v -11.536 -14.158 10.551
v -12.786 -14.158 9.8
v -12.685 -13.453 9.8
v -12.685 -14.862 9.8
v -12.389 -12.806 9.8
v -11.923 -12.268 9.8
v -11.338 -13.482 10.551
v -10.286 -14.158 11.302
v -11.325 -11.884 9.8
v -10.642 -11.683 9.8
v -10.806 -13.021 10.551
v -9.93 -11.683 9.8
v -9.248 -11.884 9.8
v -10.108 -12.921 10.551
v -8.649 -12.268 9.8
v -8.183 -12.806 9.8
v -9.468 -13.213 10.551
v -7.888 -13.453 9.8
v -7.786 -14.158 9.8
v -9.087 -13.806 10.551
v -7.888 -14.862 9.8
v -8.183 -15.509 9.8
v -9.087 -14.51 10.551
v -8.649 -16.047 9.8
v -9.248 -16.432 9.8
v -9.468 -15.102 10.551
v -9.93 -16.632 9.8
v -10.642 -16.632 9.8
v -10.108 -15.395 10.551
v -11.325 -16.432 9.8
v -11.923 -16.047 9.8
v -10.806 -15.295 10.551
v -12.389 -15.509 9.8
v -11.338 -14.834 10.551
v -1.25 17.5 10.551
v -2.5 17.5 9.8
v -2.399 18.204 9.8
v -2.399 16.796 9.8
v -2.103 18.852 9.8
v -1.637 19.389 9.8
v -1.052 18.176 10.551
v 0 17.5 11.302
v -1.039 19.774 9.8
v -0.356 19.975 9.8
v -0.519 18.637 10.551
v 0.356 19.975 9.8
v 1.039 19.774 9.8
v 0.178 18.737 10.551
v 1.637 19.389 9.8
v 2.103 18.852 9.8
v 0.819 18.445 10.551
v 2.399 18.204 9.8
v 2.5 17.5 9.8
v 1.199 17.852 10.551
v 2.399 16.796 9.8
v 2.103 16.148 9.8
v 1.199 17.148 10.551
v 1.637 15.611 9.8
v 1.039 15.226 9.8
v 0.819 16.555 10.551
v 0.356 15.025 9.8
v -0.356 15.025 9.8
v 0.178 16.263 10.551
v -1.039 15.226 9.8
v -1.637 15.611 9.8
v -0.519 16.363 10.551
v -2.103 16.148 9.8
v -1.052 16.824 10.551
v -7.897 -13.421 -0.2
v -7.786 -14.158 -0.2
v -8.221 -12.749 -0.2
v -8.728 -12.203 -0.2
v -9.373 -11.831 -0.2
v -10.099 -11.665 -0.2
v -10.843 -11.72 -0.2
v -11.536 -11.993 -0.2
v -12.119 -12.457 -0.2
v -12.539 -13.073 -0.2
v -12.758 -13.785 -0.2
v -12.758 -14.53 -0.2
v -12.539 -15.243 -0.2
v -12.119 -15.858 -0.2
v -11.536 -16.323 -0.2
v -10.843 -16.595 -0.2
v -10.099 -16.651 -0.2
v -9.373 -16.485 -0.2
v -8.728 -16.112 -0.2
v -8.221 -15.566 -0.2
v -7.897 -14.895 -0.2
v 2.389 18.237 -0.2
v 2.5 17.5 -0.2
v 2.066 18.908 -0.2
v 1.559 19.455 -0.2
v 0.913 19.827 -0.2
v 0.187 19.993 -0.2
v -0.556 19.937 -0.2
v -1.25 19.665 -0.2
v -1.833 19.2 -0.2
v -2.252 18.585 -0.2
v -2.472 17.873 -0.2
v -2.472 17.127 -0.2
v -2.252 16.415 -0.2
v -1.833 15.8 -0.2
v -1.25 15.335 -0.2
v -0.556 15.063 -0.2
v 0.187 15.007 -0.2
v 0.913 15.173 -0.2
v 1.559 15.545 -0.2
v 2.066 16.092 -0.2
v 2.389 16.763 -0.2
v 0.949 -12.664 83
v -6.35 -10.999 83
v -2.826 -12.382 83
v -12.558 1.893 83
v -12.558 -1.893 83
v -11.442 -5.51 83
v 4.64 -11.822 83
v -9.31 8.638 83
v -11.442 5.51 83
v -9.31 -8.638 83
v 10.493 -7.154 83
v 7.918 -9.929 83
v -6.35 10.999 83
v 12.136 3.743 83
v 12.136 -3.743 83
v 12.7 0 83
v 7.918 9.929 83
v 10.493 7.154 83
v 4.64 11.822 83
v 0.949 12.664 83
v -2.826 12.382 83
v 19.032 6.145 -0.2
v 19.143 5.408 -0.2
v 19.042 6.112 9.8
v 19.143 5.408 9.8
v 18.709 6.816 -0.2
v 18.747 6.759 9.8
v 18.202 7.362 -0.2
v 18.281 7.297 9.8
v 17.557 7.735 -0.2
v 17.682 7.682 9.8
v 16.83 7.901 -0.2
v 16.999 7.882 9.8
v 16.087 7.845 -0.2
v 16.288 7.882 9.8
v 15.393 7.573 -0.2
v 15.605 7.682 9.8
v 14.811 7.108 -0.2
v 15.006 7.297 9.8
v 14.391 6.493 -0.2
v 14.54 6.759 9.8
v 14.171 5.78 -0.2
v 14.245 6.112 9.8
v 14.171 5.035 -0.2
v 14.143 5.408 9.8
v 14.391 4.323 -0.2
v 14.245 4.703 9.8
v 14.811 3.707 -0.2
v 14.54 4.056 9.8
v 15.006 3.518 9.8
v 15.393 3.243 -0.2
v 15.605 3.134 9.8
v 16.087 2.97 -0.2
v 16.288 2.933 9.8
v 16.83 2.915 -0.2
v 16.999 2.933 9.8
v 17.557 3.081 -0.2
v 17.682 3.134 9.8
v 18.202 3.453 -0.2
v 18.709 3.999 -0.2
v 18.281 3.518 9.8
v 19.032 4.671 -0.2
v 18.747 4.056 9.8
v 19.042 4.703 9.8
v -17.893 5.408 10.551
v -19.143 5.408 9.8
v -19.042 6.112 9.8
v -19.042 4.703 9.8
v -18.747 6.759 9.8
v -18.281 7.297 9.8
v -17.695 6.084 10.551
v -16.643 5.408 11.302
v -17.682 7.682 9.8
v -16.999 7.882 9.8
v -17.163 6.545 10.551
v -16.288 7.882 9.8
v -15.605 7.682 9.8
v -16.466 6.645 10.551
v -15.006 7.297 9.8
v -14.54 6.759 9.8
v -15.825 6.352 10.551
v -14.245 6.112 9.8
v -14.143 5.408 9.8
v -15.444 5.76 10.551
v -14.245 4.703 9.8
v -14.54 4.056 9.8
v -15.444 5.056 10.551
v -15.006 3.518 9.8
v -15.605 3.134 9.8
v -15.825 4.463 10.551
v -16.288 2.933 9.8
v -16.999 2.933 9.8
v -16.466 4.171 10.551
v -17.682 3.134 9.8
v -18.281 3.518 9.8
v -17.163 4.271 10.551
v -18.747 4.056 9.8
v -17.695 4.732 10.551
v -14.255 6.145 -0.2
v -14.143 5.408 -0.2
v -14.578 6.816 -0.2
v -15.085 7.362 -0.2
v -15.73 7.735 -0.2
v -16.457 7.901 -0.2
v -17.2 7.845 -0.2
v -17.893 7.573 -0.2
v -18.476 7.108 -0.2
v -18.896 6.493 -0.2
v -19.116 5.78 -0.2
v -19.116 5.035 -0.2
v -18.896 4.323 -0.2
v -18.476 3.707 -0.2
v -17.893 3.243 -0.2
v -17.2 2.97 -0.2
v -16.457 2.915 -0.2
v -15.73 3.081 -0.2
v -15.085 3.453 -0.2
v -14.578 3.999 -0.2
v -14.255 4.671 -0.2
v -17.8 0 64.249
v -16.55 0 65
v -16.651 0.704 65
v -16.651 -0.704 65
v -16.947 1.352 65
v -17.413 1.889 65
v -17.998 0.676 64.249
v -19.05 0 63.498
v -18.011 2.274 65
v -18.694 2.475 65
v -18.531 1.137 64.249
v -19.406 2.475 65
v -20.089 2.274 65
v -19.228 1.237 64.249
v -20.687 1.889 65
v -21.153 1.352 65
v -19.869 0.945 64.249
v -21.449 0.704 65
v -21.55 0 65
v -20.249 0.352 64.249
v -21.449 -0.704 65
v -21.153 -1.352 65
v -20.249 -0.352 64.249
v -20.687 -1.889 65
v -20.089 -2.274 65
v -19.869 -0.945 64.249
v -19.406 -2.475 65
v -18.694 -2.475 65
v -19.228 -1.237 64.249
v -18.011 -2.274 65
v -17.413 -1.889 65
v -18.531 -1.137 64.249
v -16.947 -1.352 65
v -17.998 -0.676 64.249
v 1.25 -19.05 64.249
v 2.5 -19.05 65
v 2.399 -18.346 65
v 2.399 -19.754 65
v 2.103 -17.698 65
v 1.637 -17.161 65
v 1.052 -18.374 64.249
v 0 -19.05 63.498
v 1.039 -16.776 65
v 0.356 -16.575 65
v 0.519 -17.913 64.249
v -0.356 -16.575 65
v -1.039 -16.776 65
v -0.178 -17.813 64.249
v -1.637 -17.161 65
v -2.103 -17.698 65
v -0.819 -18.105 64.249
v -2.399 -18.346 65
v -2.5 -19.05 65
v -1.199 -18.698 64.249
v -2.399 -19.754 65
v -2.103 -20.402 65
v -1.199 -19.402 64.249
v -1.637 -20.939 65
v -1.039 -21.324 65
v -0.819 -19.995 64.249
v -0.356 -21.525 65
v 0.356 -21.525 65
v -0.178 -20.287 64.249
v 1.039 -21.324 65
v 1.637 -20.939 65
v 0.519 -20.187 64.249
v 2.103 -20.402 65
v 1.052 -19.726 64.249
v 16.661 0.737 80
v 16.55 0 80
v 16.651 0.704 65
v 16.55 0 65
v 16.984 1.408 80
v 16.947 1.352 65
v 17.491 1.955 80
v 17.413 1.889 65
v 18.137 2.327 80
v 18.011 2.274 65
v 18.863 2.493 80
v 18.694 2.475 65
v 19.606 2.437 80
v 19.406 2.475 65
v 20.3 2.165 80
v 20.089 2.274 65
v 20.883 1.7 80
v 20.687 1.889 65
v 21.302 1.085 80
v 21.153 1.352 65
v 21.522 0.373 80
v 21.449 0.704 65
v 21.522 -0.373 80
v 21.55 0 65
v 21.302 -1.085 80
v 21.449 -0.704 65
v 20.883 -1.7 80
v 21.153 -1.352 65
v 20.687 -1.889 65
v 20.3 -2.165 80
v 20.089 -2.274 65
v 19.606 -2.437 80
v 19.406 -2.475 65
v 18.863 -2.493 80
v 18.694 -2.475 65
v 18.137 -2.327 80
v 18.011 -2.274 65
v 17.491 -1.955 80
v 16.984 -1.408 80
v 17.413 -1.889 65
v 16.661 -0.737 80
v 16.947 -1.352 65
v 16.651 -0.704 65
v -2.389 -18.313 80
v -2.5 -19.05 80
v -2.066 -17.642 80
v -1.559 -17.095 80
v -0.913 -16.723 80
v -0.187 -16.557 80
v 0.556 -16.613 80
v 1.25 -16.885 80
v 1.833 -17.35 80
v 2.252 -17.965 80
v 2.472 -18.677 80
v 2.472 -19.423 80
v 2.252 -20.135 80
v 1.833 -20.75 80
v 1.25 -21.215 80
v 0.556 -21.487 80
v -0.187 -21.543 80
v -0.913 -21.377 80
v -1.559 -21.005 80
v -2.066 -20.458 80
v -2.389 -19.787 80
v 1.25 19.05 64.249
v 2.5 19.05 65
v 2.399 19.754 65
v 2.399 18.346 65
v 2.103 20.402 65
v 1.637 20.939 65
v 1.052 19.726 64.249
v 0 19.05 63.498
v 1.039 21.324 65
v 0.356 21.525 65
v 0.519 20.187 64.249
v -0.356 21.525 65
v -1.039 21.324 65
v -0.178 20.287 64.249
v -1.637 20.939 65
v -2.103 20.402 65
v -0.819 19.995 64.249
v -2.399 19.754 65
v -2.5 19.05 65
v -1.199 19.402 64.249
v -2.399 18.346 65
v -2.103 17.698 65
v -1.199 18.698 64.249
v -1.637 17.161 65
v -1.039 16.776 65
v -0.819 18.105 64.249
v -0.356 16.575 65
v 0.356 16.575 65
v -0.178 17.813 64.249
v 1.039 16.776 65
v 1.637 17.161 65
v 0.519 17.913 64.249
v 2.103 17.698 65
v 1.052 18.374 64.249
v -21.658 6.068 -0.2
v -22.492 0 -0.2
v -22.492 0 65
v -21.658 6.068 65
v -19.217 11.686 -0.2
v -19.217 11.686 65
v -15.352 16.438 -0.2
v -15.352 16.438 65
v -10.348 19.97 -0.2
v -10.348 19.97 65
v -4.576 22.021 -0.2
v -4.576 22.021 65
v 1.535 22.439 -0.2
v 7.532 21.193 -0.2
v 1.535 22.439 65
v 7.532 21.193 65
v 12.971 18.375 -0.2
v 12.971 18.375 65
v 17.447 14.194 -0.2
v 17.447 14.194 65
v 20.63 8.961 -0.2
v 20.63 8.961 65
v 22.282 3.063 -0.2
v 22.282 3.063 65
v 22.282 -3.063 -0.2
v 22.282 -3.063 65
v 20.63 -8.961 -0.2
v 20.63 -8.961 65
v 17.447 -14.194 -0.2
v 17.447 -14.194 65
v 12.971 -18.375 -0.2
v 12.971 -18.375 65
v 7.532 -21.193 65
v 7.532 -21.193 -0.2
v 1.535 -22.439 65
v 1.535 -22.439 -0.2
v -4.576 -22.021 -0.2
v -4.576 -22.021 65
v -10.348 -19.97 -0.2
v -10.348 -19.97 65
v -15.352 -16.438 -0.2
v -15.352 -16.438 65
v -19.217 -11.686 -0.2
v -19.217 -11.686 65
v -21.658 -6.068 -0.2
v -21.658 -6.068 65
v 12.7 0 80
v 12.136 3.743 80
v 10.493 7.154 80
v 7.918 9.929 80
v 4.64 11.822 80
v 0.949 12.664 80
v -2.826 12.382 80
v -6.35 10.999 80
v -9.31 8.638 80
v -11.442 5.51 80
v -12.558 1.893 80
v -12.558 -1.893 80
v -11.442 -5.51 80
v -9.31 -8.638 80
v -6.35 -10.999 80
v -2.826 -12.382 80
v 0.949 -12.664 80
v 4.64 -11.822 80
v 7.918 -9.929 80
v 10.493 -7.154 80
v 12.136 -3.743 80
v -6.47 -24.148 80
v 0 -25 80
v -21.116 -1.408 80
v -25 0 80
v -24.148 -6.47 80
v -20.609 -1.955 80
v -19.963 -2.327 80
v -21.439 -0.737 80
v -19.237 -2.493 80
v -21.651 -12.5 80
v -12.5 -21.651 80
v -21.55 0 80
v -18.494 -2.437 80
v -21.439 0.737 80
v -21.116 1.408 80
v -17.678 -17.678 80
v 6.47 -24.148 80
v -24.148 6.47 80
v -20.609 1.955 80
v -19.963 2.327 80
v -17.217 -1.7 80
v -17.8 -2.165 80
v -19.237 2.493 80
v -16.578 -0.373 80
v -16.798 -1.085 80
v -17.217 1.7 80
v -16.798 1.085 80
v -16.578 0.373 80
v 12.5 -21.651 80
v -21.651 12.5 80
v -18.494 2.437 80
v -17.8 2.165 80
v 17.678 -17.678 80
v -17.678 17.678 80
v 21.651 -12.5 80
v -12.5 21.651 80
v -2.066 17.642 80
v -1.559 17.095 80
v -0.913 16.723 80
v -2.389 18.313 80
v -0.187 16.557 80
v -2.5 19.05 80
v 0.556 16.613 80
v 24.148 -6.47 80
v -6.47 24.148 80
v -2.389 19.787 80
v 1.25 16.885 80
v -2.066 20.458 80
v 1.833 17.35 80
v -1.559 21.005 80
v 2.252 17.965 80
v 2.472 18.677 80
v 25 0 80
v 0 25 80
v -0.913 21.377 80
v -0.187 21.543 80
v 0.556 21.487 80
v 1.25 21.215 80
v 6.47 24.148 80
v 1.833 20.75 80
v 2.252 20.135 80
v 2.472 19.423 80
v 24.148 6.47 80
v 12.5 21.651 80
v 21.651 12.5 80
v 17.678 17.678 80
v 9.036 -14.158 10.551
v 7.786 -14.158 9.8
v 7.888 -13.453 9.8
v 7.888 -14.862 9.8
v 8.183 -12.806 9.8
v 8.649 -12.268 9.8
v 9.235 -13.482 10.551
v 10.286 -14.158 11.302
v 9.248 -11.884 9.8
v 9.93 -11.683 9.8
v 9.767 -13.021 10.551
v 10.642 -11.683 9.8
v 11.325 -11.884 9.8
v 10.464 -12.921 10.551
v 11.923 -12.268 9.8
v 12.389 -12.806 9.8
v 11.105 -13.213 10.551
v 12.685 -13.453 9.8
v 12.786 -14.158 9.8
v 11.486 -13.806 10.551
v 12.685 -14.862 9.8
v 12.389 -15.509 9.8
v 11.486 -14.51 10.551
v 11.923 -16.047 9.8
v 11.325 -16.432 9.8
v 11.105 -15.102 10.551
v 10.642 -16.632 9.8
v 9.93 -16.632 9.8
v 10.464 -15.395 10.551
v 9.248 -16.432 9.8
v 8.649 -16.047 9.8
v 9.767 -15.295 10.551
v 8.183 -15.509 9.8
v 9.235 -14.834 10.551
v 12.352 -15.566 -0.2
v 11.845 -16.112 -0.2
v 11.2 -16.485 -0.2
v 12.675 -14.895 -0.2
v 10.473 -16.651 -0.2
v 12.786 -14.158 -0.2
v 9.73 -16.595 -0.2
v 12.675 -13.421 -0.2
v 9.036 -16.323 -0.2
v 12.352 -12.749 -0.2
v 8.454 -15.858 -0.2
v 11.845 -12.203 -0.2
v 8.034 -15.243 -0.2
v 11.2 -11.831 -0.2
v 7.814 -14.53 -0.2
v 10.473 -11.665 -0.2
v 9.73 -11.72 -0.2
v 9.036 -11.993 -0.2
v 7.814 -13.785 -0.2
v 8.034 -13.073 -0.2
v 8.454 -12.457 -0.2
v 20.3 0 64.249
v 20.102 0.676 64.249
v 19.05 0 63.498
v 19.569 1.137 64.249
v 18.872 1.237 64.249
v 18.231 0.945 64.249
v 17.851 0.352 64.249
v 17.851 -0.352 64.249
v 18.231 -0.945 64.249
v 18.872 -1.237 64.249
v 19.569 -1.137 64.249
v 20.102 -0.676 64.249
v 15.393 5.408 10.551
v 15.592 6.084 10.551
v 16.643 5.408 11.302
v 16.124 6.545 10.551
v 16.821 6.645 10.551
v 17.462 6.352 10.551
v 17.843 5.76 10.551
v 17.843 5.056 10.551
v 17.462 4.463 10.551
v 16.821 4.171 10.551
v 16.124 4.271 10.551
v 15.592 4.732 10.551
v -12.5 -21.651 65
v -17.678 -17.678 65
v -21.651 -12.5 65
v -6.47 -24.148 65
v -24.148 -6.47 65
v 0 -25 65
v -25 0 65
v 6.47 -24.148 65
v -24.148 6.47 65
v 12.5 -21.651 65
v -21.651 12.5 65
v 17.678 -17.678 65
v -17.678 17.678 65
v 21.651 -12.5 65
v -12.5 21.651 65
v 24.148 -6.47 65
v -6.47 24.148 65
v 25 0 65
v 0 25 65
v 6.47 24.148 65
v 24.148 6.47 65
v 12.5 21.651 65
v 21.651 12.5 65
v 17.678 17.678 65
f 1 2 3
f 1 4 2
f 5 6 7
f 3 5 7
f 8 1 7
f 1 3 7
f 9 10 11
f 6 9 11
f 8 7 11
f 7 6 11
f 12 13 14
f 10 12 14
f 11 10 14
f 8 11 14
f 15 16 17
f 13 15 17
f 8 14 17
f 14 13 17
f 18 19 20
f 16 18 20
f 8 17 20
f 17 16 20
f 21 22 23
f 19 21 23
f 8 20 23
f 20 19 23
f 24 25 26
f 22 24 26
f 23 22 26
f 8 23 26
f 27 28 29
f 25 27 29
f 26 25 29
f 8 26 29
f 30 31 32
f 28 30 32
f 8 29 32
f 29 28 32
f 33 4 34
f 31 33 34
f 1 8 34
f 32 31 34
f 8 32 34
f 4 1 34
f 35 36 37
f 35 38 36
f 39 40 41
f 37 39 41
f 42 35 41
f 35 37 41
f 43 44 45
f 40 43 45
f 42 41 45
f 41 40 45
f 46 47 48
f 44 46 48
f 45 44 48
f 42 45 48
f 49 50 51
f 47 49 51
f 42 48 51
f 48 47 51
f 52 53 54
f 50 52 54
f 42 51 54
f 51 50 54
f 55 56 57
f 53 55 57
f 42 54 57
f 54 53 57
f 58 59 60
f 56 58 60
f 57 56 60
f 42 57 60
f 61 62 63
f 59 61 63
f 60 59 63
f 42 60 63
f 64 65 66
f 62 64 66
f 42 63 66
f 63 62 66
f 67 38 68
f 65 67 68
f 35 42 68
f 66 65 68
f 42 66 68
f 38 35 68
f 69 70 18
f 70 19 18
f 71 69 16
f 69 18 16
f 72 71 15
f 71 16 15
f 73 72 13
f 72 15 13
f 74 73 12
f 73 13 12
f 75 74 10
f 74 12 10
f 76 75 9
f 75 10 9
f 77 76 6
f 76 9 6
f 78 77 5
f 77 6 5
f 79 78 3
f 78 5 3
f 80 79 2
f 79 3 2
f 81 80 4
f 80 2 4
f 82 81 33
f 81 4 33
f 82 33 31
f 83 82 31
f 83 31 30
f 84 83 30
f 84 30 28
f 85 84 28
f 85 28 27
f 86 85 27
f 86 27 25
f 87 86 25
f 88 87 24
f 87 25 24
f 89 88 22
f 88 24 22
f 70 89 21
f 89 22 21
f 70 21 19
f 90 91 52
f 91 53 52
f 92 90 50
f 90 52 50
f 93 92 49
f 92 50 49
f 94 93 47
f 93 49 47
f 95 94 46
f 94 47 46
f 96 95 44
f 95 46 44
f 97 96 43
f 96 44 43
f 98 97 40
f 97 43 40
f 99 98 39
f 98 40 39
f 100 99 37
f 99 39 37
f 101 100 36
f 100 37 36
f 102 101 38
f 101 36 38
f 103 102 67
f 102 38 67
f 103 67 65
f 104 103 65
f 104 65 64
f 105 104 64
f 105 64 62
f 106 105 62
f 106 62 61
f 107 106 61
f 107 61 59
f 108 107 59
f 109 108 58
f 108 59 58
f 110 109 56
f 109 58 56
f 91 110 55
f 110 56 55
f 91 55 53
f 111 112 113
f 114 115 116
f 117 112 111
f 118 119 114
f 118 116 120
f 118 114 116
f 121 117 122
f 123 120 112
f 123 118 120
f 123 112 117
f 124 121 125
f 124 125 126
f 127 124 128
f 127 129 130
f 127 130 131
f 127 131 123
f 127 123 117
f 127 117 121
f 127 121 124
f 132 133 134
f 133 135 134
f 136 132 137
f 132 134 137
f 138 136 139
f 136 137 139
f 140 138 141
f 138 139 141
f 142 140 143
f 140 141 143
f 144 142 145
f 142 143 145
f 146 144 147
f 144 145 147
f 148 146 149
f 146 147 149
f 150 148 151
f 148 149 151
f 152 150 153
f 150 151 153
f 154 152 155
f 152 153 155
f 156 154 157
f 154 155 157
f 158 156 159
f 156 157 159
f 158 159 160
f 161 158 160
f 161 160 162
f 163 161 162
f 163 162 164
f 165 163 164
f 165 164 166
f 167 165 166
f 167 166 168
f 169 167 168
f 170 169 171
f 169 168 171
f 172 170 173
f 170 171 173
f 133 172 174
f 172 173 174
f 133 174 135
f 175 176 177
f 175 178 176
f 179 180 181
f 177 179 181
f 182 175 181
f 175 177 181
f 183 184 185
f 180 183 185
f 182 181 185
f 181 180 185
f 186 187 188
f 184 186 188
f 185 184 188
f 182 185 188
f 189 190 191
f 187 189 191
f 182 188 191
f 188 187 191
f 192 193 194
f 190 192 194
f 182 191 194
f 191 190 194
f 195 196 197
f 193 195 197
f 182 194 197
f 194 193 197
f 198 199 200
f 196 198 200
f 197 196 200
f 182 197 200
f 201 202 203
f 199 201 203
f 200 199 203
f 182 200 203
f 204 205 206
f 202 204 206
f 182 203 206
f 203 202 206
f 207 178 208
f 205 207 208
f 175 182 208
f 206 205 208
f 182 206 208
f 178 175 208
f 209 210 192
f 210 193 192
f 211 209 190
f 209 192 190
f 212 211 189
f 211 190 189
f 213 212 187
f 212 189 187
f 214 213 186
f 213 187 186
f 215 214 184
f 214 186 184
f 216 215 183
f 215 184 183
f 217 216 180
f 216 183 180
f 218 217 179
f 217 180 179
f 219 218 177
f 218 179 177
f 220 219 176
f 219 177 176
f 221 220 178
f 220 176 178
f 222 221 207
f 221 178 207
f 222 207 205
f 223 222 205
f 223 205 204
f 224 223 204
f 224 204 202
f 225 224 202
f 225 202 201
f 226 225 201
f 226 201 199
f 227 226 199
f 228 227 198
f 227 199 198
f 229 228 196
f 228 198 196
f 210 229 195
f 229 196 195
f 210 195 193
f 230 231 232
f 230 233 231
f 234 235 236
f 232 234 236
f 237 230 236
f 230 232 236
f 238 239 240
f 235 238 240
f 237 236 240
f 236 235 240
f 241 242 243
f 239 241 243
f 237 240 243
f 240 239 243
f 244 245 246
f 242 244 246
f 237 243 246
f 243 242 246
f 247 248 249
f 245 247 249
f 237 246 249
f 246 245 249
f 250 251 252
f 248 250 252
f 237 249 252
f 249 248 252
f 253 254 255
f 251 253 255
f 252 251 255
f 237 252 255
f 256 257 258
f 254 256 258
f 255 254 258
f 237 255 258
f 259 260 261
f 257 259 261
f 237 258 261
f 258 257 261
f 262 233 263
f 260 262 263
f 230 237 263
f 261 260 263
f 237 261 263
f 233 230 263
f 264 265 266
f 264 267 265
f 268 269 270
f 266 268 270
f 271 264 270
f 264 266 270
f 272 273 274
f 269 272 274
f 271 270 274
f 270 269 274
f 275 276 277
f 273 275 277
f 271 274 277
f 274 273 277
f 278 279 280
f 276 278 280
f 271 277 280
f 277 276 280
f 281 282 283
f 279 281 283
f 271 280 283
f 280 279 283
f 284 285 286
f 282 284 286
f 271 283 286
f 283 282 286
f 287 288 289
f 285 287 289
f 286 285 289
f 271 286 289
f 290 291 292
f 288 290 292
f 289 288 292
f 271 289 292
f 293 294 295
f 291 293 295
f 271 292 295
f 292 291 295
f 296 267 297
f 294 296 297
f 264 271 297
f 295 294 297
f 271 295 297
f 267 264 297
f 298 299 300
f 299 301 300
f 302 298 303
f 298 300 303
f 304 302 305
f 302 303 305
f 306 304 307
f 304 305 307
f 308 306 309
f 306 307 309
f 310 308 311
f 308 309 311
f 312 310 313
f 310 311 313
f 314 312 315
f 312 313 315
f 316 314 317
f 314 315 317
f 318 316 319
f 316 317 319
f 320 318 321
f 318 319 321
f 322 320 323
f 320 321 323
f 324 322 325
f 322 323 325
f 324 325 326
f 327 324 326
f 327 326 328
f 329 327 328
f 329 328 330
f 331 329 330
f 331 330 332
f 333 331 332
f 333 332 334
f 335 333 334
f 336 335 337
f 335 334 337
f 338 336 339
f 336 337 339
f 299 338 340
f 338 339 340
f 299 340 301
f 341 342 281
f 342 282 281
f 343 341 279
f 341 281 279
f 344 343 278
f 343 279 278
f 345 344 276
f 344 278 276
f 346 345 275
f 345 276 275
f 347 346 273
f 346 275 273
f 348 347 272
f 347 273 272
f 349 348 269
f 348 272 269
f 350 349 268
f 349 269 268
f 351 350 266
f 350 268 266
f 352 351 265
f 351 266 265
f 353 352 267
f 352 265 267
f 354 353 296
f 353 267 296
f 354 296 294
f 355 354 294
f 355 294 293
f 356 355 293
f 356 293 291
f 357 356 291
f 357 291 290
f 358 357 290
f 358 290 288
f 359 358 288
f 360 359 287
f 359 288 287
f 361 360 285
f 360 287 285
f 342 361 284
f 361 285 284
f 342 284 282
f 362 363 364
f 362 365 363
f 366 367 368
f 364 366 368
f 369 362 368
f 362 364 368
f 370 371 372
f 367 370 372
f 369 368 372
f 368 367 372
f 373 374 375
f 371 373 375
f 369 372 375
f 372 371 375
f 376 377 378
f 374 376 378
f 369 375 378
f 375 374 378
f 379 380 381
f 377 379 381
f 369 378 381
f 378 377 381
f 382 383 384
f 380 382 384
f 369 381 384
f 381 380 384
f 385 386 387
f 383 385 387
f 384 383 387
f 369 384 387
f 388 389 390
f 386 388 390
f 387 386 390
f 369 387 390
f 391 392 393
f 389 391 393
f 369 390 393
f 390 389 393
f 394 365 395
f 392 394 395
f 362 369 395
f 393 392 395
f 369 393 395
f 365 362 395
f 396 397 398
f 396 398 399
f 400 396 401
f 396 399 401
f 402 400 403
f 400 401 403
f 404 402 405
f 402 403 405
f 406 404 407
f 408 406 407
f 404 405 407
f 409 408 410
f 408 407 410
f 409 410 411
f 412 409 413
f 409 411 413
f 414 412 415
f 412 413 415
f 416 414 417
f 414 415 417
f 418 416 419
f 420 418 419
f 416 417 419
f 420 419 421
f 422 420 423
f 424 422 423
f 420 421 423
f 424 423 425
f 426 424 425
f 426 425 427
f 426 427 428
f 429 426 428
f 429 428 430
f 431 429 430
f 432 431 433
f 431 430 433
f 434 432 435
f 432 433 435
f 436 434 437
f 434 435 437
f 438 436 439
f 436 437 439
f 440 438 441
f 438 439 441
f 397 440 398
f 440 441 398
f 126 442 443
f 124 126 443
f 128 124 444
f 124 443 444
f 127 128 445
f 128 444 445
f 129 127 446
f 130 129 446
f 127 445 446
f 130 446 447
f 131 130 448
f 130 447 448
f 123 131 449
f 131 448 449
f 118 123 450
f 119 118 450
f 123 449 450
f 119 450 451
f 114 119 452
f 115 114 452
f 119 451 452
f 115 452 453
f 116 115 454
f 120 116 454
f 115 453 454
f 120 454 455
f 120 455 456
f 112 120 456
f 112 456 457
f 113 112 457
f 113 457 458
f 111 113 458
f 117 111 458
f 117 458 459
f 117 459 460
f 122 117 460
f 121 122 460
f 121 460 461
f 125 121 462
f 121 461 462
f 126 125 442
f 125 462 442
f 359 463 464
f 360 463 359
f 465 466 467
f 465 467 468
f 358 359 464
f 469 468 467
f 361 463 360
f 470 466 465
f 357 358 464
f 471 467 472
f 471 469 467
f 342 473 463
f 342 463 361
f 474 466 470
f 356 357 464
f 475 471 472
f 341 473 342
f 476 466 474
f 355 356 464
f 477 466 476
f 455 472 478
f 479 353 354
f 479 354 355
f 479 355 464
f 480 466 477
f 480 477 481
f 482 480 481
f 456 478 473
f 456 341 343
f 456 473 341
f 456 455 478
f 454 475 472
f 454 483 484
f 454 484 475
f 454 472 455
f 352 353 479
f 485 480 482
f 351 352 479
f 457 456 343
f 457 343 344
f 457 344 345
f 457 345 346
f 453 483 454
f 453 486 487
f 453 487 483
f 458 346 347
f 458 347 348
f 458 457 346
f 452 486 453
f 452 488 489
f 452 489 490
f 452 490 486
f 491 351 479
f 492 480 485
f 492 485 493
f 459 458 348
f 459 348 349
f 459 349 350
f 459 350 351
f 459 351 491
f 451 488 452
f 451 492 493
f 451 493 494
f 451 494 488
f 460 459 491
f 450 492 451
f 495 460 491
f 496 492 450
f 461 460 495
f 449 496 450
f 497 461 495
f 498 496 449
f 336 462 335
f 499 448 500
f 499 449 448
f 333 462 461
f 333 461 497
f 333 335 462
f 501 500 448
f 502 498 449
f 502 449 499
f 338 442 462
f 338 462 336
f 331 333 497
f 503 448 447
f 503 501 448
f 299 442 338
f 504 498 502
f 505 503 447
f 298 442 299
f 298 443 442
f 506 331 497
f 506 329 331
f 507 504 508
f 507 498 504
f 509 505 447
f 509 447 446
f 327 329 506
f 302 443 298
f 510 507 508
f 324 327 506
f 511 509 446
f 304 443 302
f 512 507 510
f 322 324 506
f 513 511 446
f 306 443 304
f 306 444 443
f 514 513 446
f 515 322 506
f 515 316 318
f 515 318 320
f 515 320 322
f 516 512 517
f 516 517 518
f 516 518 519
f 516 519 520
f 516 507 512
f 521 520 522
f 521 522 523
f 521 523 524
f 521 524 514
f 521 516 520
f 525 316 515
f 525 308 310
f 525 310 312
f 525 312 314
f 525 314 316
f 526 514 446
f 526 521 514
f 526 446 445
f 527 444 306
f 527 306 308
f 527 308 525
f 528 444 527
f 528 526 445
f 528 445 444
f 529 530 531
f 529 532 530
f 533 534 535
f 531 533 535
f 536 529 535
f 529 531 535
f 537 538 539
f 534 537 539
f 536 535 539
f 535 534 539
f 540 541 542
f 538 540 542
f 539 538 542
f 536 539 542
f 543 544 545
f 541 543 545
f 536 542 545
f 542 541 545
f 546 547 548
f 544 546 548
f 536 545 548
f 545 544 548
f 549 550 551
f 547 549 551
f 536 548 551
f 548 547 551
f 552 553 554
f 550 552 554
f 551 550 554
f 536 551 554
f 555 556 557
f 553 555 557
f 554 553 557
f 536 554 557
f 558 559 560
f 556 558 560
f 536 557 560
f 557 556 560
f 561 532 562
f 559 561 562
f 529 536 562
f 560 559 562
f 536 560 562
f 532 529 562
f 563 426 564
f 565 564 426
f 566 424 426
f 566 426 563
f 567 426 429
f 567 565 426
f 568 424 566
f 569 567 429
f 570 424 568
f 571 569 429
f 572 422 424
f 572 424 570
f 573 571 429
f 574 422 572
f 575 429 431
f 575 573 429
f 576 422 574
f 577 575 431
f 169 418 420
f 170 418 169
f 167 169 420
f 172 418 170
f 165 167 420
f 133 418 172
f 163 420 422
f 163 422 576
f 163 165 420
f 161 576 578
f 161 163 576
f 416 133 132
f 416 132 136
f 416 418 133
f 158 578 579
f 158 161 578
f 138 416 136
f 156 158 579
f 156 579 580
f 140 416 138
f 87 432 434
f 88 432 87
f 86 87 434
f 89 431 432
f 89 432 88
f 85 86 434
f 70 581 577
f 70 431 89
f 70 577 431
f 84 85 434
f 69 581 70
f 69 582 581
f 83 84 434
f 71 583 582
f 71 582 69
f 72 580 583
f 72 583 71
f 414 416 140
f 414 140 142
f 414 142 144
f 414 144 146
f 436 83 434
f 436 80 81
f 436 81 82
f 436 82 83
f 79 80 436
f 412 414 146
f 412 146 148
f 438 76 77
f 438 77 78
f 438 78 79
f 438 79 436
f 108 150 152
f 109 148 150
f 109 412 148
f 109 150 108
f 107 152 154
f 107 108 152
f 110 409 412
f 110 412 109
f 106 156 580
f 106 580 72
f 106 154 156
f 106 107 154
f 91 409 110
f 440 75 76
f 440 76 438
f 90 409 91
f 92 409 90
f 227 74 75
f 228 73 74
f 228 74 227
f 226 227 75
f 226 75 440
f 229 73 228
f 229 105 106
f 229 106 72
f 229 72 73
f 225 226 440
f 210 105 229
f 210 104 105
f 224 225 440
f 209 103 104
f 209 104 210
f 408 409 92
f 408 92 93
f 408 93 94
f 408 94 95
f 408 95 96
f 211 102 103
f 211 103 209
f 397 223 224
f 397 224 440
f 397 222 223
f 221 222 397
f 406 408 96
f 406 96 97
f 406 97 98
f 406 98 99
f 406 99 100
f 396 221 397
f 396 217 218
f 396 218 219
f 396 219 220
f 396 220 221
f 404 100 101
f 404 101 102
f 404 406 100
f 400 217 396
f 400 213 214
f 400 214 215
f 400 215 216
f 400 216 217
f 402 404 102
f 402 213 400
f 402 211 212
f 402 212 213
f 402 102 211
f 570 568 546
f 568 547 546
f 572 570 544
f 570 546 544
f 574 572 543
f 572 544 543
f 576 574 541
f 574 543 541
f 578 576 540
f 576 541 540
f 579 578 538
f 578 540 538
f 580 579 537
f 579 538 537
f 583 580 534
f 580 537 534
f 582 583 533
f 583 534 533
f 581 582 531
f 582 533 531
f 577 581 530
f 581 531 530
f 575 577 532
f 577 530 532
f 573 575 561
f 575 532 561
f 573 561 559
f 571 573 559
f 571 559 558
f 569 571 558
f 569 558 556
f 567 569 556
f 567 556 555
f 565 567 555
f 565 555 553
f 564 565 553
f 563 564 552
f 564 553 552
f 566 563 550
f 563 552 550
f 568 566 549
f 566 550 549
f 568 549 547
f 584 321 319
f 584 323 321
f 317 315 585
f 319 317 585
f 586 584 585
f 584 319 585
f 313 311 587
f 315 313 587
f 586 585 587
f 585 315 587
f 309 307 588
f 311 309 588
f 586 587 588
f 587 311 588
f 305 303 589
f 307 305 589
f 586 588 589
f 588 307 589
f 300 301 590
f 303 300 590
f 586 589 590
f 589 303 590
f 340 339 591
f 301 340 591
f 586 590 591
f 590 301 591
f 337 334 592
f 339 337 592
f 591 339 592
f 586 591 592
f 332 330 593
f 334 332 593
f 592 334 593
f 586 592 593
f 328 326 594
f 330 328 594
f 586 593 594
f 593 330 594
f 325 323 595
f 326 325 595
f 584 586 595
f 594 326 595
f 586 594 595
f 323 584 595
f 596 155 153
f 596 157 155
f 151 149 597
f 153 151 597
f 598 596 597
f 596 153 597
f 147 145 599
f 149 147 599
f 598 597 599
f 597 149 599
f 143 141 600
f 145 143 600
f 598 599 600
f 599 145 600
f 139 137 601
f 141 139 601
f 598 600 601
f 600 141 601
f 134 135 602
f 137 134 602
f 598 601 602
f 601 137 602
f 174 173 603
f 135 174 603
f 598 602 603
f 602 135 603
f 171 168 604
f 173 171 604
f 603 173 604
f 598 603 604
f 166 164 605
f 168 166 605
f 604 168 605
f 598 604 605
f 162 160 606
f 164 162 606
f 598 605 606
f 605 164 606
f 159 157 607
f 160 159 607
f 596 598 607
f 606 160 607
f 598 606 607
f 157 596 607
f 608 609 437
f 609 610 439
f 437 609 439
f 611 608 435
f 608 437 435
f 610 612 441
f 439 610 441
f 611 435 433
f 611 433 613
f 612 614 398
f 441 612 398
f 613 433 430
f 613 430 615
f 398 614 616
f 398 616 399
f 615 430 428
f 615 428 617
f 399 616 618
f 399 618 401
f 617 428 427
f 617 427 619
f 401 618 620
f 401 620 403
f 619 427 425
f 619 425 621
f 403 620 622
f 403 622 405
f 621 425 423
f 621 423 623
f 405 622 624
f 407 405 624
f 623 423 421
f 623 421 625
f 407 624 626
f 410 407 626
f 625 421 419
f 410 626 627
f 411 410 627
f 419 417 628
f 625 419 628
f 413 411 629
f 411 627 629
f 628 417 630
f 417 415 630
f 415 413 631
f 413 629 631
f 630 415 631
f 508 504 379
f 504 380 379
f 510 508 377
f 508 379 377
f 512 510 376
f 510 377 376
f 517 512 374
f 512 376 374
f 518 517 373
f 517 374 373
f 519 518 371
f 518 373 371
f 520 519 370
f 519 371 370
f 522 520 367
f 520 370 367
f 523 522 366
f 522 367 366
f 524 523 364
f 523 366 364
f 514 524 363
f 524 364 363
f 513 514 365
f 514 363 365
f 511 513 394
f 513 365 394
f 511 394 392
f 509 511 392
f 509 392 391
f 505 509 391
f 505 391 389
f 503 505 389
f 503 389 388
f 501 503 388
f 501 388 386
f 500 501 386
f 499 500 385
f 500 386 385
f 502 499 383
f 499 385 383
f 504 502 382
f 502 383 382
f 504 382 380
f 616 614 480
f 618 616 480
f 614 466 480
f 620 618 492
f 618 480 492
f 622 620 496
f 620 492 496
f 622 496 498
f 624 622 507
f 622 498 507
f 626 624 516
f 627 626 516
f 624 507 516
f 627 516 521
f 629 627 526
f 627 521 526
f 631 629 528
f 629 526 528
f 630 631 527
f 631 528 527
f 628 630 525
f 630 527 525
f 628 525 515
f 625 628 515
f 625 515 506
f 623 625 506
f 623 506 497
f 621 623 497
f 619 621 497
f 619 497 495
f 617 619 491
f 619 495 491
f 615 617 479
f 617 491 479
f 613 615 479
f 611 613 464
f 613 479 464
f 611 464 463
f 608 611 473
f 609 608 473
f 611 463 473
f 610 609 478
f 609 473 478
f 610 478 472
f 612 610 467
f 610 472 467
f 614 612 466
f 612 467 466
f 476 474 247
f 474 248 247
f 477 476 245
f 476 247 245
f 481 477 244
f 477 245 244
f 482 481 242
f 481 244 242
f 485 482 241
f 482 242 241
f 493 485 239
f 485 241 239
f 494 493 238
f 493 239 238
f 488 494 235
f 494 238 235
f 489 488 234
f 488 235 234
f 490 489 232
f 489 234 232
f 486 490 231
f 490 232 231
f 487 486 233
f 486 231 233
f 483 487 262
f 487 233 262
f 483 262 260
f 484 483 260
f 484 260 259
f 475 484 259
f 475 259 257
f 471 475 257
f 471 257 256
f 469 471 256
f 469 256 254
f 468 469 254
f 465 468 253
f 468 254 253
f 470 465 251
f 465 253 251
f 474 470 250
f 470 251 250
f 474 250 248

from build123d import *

# Parameters (mm, degrees)
SKETCH1_W                 = 25
SKETCH1_H                 = 15
SKETCH2_R                 = 12.7
BOSS_EXTRUDE1_DEPTH       = 3
SKETCH3_R                 = 22.4917
BOSS_EXTRUDE2_DEPTH       = 65.2
M6X1_0_TAPPED_HOLE1_D     = 5
M6X1_0_TAPPED_HOLE1_DEPTH = 10
M6X1_0_TAPPED_HOLE1_TIP   = 1.502151548
M6X1_0_TAPPED_HOLE2_D     = 5
M6X1_0_TAPPED_HOLE2_DEPTH = 15
M6X1_0_TAPPED_HOLE2_TIP   = 1.502151548


with BuildPart() as part:
    # Sketch1 → Revolve1 (revolve)
    with BuildSketch(Plane.XZ, mode=Mode.PRIVATE) as revolve1_sk:
        with Locations((12.5, 72.5)):
            Rectangle(SKETCH1_W, SKETCH1_H)
    revolve(revolve1_sk.sketch.rotate(Axis((0, 0, 80), (0, 0, -1)), 180), axis=Axis((0, 0, 80), (0, 0, -1)))

    # Sketch2 → Boss-Extrude1 (add)
    with BuildSketch(Plane.XY.offset(80)):
        Circle(SKETCH2_R)
    extrude(amount=BOSS_EXTRUDE1_DEPTH)

    # Sketch3 → Boss-Extrude2 (add)
    with BuildSketch(Plane(origin=(0, 0, 65), x_dir=(-1, 0, 0), z_dir=(0, 0, -1))):
        Circle(SKETCH3_R)
    extrude(amount=BOSS_EXTRUDE2_DEPTH)

    # M6x1.0 Tapped Hole1
    with Locations(Plane(origin=(0, 0, -0.2), x_dir=(-1, 0, 0), z_dir=(0, 0, -1))):
        with Locations((0, 17.5), (16.643489035, 5.407797402), (10.286241915, -14.157797402), (-10.286241915, -14.157797402), (-16.643489035, 5.407797402)):
            Hole(M6X1_0_TAPPED_HOLE1_D / 2, depth=M6X1_0_TAPPED_HOLE1_DEPTH)
            with Locations((0, 0, -(M6X1_0_TAPPED_HOLE1_DEPTH + M6X1_0_TAPPED_HOLE1_TIP / 2))):  # 118° drill point
                Cone(0, M6X1_0_TAPPED_HOLE1_D / 2, M6X1_0_TAPPED_HOLE1_TIP, mode=Mode.SUBTRACT)

    # M6x1.0 Tapped Hole2
    with Locations(Plane.XY.offset(80)):
        with Locations((-19.05, 0), (0, -19.05), (19.05, 0), (0, 19.05)):
            Hole(M6X1_0_TAPPED_HOLE2_D / 2, depth=M6X1_0_TAPPED_HOLE2_DEPTH)
            with Locations((0, 0, -(M6X1_0_TAPPED_HOLE2_DEPTH + M6X1_0_TAPPED_HOLE2_TIP / 2))):  # 118° drill point
                Cone(0, M6X1_0_TAPPED_HOLE2_D / 2, M6X1_0_TAPPED_HOLE2_TIP, mode=Mode.SUBTRACT)


solid = part.part
